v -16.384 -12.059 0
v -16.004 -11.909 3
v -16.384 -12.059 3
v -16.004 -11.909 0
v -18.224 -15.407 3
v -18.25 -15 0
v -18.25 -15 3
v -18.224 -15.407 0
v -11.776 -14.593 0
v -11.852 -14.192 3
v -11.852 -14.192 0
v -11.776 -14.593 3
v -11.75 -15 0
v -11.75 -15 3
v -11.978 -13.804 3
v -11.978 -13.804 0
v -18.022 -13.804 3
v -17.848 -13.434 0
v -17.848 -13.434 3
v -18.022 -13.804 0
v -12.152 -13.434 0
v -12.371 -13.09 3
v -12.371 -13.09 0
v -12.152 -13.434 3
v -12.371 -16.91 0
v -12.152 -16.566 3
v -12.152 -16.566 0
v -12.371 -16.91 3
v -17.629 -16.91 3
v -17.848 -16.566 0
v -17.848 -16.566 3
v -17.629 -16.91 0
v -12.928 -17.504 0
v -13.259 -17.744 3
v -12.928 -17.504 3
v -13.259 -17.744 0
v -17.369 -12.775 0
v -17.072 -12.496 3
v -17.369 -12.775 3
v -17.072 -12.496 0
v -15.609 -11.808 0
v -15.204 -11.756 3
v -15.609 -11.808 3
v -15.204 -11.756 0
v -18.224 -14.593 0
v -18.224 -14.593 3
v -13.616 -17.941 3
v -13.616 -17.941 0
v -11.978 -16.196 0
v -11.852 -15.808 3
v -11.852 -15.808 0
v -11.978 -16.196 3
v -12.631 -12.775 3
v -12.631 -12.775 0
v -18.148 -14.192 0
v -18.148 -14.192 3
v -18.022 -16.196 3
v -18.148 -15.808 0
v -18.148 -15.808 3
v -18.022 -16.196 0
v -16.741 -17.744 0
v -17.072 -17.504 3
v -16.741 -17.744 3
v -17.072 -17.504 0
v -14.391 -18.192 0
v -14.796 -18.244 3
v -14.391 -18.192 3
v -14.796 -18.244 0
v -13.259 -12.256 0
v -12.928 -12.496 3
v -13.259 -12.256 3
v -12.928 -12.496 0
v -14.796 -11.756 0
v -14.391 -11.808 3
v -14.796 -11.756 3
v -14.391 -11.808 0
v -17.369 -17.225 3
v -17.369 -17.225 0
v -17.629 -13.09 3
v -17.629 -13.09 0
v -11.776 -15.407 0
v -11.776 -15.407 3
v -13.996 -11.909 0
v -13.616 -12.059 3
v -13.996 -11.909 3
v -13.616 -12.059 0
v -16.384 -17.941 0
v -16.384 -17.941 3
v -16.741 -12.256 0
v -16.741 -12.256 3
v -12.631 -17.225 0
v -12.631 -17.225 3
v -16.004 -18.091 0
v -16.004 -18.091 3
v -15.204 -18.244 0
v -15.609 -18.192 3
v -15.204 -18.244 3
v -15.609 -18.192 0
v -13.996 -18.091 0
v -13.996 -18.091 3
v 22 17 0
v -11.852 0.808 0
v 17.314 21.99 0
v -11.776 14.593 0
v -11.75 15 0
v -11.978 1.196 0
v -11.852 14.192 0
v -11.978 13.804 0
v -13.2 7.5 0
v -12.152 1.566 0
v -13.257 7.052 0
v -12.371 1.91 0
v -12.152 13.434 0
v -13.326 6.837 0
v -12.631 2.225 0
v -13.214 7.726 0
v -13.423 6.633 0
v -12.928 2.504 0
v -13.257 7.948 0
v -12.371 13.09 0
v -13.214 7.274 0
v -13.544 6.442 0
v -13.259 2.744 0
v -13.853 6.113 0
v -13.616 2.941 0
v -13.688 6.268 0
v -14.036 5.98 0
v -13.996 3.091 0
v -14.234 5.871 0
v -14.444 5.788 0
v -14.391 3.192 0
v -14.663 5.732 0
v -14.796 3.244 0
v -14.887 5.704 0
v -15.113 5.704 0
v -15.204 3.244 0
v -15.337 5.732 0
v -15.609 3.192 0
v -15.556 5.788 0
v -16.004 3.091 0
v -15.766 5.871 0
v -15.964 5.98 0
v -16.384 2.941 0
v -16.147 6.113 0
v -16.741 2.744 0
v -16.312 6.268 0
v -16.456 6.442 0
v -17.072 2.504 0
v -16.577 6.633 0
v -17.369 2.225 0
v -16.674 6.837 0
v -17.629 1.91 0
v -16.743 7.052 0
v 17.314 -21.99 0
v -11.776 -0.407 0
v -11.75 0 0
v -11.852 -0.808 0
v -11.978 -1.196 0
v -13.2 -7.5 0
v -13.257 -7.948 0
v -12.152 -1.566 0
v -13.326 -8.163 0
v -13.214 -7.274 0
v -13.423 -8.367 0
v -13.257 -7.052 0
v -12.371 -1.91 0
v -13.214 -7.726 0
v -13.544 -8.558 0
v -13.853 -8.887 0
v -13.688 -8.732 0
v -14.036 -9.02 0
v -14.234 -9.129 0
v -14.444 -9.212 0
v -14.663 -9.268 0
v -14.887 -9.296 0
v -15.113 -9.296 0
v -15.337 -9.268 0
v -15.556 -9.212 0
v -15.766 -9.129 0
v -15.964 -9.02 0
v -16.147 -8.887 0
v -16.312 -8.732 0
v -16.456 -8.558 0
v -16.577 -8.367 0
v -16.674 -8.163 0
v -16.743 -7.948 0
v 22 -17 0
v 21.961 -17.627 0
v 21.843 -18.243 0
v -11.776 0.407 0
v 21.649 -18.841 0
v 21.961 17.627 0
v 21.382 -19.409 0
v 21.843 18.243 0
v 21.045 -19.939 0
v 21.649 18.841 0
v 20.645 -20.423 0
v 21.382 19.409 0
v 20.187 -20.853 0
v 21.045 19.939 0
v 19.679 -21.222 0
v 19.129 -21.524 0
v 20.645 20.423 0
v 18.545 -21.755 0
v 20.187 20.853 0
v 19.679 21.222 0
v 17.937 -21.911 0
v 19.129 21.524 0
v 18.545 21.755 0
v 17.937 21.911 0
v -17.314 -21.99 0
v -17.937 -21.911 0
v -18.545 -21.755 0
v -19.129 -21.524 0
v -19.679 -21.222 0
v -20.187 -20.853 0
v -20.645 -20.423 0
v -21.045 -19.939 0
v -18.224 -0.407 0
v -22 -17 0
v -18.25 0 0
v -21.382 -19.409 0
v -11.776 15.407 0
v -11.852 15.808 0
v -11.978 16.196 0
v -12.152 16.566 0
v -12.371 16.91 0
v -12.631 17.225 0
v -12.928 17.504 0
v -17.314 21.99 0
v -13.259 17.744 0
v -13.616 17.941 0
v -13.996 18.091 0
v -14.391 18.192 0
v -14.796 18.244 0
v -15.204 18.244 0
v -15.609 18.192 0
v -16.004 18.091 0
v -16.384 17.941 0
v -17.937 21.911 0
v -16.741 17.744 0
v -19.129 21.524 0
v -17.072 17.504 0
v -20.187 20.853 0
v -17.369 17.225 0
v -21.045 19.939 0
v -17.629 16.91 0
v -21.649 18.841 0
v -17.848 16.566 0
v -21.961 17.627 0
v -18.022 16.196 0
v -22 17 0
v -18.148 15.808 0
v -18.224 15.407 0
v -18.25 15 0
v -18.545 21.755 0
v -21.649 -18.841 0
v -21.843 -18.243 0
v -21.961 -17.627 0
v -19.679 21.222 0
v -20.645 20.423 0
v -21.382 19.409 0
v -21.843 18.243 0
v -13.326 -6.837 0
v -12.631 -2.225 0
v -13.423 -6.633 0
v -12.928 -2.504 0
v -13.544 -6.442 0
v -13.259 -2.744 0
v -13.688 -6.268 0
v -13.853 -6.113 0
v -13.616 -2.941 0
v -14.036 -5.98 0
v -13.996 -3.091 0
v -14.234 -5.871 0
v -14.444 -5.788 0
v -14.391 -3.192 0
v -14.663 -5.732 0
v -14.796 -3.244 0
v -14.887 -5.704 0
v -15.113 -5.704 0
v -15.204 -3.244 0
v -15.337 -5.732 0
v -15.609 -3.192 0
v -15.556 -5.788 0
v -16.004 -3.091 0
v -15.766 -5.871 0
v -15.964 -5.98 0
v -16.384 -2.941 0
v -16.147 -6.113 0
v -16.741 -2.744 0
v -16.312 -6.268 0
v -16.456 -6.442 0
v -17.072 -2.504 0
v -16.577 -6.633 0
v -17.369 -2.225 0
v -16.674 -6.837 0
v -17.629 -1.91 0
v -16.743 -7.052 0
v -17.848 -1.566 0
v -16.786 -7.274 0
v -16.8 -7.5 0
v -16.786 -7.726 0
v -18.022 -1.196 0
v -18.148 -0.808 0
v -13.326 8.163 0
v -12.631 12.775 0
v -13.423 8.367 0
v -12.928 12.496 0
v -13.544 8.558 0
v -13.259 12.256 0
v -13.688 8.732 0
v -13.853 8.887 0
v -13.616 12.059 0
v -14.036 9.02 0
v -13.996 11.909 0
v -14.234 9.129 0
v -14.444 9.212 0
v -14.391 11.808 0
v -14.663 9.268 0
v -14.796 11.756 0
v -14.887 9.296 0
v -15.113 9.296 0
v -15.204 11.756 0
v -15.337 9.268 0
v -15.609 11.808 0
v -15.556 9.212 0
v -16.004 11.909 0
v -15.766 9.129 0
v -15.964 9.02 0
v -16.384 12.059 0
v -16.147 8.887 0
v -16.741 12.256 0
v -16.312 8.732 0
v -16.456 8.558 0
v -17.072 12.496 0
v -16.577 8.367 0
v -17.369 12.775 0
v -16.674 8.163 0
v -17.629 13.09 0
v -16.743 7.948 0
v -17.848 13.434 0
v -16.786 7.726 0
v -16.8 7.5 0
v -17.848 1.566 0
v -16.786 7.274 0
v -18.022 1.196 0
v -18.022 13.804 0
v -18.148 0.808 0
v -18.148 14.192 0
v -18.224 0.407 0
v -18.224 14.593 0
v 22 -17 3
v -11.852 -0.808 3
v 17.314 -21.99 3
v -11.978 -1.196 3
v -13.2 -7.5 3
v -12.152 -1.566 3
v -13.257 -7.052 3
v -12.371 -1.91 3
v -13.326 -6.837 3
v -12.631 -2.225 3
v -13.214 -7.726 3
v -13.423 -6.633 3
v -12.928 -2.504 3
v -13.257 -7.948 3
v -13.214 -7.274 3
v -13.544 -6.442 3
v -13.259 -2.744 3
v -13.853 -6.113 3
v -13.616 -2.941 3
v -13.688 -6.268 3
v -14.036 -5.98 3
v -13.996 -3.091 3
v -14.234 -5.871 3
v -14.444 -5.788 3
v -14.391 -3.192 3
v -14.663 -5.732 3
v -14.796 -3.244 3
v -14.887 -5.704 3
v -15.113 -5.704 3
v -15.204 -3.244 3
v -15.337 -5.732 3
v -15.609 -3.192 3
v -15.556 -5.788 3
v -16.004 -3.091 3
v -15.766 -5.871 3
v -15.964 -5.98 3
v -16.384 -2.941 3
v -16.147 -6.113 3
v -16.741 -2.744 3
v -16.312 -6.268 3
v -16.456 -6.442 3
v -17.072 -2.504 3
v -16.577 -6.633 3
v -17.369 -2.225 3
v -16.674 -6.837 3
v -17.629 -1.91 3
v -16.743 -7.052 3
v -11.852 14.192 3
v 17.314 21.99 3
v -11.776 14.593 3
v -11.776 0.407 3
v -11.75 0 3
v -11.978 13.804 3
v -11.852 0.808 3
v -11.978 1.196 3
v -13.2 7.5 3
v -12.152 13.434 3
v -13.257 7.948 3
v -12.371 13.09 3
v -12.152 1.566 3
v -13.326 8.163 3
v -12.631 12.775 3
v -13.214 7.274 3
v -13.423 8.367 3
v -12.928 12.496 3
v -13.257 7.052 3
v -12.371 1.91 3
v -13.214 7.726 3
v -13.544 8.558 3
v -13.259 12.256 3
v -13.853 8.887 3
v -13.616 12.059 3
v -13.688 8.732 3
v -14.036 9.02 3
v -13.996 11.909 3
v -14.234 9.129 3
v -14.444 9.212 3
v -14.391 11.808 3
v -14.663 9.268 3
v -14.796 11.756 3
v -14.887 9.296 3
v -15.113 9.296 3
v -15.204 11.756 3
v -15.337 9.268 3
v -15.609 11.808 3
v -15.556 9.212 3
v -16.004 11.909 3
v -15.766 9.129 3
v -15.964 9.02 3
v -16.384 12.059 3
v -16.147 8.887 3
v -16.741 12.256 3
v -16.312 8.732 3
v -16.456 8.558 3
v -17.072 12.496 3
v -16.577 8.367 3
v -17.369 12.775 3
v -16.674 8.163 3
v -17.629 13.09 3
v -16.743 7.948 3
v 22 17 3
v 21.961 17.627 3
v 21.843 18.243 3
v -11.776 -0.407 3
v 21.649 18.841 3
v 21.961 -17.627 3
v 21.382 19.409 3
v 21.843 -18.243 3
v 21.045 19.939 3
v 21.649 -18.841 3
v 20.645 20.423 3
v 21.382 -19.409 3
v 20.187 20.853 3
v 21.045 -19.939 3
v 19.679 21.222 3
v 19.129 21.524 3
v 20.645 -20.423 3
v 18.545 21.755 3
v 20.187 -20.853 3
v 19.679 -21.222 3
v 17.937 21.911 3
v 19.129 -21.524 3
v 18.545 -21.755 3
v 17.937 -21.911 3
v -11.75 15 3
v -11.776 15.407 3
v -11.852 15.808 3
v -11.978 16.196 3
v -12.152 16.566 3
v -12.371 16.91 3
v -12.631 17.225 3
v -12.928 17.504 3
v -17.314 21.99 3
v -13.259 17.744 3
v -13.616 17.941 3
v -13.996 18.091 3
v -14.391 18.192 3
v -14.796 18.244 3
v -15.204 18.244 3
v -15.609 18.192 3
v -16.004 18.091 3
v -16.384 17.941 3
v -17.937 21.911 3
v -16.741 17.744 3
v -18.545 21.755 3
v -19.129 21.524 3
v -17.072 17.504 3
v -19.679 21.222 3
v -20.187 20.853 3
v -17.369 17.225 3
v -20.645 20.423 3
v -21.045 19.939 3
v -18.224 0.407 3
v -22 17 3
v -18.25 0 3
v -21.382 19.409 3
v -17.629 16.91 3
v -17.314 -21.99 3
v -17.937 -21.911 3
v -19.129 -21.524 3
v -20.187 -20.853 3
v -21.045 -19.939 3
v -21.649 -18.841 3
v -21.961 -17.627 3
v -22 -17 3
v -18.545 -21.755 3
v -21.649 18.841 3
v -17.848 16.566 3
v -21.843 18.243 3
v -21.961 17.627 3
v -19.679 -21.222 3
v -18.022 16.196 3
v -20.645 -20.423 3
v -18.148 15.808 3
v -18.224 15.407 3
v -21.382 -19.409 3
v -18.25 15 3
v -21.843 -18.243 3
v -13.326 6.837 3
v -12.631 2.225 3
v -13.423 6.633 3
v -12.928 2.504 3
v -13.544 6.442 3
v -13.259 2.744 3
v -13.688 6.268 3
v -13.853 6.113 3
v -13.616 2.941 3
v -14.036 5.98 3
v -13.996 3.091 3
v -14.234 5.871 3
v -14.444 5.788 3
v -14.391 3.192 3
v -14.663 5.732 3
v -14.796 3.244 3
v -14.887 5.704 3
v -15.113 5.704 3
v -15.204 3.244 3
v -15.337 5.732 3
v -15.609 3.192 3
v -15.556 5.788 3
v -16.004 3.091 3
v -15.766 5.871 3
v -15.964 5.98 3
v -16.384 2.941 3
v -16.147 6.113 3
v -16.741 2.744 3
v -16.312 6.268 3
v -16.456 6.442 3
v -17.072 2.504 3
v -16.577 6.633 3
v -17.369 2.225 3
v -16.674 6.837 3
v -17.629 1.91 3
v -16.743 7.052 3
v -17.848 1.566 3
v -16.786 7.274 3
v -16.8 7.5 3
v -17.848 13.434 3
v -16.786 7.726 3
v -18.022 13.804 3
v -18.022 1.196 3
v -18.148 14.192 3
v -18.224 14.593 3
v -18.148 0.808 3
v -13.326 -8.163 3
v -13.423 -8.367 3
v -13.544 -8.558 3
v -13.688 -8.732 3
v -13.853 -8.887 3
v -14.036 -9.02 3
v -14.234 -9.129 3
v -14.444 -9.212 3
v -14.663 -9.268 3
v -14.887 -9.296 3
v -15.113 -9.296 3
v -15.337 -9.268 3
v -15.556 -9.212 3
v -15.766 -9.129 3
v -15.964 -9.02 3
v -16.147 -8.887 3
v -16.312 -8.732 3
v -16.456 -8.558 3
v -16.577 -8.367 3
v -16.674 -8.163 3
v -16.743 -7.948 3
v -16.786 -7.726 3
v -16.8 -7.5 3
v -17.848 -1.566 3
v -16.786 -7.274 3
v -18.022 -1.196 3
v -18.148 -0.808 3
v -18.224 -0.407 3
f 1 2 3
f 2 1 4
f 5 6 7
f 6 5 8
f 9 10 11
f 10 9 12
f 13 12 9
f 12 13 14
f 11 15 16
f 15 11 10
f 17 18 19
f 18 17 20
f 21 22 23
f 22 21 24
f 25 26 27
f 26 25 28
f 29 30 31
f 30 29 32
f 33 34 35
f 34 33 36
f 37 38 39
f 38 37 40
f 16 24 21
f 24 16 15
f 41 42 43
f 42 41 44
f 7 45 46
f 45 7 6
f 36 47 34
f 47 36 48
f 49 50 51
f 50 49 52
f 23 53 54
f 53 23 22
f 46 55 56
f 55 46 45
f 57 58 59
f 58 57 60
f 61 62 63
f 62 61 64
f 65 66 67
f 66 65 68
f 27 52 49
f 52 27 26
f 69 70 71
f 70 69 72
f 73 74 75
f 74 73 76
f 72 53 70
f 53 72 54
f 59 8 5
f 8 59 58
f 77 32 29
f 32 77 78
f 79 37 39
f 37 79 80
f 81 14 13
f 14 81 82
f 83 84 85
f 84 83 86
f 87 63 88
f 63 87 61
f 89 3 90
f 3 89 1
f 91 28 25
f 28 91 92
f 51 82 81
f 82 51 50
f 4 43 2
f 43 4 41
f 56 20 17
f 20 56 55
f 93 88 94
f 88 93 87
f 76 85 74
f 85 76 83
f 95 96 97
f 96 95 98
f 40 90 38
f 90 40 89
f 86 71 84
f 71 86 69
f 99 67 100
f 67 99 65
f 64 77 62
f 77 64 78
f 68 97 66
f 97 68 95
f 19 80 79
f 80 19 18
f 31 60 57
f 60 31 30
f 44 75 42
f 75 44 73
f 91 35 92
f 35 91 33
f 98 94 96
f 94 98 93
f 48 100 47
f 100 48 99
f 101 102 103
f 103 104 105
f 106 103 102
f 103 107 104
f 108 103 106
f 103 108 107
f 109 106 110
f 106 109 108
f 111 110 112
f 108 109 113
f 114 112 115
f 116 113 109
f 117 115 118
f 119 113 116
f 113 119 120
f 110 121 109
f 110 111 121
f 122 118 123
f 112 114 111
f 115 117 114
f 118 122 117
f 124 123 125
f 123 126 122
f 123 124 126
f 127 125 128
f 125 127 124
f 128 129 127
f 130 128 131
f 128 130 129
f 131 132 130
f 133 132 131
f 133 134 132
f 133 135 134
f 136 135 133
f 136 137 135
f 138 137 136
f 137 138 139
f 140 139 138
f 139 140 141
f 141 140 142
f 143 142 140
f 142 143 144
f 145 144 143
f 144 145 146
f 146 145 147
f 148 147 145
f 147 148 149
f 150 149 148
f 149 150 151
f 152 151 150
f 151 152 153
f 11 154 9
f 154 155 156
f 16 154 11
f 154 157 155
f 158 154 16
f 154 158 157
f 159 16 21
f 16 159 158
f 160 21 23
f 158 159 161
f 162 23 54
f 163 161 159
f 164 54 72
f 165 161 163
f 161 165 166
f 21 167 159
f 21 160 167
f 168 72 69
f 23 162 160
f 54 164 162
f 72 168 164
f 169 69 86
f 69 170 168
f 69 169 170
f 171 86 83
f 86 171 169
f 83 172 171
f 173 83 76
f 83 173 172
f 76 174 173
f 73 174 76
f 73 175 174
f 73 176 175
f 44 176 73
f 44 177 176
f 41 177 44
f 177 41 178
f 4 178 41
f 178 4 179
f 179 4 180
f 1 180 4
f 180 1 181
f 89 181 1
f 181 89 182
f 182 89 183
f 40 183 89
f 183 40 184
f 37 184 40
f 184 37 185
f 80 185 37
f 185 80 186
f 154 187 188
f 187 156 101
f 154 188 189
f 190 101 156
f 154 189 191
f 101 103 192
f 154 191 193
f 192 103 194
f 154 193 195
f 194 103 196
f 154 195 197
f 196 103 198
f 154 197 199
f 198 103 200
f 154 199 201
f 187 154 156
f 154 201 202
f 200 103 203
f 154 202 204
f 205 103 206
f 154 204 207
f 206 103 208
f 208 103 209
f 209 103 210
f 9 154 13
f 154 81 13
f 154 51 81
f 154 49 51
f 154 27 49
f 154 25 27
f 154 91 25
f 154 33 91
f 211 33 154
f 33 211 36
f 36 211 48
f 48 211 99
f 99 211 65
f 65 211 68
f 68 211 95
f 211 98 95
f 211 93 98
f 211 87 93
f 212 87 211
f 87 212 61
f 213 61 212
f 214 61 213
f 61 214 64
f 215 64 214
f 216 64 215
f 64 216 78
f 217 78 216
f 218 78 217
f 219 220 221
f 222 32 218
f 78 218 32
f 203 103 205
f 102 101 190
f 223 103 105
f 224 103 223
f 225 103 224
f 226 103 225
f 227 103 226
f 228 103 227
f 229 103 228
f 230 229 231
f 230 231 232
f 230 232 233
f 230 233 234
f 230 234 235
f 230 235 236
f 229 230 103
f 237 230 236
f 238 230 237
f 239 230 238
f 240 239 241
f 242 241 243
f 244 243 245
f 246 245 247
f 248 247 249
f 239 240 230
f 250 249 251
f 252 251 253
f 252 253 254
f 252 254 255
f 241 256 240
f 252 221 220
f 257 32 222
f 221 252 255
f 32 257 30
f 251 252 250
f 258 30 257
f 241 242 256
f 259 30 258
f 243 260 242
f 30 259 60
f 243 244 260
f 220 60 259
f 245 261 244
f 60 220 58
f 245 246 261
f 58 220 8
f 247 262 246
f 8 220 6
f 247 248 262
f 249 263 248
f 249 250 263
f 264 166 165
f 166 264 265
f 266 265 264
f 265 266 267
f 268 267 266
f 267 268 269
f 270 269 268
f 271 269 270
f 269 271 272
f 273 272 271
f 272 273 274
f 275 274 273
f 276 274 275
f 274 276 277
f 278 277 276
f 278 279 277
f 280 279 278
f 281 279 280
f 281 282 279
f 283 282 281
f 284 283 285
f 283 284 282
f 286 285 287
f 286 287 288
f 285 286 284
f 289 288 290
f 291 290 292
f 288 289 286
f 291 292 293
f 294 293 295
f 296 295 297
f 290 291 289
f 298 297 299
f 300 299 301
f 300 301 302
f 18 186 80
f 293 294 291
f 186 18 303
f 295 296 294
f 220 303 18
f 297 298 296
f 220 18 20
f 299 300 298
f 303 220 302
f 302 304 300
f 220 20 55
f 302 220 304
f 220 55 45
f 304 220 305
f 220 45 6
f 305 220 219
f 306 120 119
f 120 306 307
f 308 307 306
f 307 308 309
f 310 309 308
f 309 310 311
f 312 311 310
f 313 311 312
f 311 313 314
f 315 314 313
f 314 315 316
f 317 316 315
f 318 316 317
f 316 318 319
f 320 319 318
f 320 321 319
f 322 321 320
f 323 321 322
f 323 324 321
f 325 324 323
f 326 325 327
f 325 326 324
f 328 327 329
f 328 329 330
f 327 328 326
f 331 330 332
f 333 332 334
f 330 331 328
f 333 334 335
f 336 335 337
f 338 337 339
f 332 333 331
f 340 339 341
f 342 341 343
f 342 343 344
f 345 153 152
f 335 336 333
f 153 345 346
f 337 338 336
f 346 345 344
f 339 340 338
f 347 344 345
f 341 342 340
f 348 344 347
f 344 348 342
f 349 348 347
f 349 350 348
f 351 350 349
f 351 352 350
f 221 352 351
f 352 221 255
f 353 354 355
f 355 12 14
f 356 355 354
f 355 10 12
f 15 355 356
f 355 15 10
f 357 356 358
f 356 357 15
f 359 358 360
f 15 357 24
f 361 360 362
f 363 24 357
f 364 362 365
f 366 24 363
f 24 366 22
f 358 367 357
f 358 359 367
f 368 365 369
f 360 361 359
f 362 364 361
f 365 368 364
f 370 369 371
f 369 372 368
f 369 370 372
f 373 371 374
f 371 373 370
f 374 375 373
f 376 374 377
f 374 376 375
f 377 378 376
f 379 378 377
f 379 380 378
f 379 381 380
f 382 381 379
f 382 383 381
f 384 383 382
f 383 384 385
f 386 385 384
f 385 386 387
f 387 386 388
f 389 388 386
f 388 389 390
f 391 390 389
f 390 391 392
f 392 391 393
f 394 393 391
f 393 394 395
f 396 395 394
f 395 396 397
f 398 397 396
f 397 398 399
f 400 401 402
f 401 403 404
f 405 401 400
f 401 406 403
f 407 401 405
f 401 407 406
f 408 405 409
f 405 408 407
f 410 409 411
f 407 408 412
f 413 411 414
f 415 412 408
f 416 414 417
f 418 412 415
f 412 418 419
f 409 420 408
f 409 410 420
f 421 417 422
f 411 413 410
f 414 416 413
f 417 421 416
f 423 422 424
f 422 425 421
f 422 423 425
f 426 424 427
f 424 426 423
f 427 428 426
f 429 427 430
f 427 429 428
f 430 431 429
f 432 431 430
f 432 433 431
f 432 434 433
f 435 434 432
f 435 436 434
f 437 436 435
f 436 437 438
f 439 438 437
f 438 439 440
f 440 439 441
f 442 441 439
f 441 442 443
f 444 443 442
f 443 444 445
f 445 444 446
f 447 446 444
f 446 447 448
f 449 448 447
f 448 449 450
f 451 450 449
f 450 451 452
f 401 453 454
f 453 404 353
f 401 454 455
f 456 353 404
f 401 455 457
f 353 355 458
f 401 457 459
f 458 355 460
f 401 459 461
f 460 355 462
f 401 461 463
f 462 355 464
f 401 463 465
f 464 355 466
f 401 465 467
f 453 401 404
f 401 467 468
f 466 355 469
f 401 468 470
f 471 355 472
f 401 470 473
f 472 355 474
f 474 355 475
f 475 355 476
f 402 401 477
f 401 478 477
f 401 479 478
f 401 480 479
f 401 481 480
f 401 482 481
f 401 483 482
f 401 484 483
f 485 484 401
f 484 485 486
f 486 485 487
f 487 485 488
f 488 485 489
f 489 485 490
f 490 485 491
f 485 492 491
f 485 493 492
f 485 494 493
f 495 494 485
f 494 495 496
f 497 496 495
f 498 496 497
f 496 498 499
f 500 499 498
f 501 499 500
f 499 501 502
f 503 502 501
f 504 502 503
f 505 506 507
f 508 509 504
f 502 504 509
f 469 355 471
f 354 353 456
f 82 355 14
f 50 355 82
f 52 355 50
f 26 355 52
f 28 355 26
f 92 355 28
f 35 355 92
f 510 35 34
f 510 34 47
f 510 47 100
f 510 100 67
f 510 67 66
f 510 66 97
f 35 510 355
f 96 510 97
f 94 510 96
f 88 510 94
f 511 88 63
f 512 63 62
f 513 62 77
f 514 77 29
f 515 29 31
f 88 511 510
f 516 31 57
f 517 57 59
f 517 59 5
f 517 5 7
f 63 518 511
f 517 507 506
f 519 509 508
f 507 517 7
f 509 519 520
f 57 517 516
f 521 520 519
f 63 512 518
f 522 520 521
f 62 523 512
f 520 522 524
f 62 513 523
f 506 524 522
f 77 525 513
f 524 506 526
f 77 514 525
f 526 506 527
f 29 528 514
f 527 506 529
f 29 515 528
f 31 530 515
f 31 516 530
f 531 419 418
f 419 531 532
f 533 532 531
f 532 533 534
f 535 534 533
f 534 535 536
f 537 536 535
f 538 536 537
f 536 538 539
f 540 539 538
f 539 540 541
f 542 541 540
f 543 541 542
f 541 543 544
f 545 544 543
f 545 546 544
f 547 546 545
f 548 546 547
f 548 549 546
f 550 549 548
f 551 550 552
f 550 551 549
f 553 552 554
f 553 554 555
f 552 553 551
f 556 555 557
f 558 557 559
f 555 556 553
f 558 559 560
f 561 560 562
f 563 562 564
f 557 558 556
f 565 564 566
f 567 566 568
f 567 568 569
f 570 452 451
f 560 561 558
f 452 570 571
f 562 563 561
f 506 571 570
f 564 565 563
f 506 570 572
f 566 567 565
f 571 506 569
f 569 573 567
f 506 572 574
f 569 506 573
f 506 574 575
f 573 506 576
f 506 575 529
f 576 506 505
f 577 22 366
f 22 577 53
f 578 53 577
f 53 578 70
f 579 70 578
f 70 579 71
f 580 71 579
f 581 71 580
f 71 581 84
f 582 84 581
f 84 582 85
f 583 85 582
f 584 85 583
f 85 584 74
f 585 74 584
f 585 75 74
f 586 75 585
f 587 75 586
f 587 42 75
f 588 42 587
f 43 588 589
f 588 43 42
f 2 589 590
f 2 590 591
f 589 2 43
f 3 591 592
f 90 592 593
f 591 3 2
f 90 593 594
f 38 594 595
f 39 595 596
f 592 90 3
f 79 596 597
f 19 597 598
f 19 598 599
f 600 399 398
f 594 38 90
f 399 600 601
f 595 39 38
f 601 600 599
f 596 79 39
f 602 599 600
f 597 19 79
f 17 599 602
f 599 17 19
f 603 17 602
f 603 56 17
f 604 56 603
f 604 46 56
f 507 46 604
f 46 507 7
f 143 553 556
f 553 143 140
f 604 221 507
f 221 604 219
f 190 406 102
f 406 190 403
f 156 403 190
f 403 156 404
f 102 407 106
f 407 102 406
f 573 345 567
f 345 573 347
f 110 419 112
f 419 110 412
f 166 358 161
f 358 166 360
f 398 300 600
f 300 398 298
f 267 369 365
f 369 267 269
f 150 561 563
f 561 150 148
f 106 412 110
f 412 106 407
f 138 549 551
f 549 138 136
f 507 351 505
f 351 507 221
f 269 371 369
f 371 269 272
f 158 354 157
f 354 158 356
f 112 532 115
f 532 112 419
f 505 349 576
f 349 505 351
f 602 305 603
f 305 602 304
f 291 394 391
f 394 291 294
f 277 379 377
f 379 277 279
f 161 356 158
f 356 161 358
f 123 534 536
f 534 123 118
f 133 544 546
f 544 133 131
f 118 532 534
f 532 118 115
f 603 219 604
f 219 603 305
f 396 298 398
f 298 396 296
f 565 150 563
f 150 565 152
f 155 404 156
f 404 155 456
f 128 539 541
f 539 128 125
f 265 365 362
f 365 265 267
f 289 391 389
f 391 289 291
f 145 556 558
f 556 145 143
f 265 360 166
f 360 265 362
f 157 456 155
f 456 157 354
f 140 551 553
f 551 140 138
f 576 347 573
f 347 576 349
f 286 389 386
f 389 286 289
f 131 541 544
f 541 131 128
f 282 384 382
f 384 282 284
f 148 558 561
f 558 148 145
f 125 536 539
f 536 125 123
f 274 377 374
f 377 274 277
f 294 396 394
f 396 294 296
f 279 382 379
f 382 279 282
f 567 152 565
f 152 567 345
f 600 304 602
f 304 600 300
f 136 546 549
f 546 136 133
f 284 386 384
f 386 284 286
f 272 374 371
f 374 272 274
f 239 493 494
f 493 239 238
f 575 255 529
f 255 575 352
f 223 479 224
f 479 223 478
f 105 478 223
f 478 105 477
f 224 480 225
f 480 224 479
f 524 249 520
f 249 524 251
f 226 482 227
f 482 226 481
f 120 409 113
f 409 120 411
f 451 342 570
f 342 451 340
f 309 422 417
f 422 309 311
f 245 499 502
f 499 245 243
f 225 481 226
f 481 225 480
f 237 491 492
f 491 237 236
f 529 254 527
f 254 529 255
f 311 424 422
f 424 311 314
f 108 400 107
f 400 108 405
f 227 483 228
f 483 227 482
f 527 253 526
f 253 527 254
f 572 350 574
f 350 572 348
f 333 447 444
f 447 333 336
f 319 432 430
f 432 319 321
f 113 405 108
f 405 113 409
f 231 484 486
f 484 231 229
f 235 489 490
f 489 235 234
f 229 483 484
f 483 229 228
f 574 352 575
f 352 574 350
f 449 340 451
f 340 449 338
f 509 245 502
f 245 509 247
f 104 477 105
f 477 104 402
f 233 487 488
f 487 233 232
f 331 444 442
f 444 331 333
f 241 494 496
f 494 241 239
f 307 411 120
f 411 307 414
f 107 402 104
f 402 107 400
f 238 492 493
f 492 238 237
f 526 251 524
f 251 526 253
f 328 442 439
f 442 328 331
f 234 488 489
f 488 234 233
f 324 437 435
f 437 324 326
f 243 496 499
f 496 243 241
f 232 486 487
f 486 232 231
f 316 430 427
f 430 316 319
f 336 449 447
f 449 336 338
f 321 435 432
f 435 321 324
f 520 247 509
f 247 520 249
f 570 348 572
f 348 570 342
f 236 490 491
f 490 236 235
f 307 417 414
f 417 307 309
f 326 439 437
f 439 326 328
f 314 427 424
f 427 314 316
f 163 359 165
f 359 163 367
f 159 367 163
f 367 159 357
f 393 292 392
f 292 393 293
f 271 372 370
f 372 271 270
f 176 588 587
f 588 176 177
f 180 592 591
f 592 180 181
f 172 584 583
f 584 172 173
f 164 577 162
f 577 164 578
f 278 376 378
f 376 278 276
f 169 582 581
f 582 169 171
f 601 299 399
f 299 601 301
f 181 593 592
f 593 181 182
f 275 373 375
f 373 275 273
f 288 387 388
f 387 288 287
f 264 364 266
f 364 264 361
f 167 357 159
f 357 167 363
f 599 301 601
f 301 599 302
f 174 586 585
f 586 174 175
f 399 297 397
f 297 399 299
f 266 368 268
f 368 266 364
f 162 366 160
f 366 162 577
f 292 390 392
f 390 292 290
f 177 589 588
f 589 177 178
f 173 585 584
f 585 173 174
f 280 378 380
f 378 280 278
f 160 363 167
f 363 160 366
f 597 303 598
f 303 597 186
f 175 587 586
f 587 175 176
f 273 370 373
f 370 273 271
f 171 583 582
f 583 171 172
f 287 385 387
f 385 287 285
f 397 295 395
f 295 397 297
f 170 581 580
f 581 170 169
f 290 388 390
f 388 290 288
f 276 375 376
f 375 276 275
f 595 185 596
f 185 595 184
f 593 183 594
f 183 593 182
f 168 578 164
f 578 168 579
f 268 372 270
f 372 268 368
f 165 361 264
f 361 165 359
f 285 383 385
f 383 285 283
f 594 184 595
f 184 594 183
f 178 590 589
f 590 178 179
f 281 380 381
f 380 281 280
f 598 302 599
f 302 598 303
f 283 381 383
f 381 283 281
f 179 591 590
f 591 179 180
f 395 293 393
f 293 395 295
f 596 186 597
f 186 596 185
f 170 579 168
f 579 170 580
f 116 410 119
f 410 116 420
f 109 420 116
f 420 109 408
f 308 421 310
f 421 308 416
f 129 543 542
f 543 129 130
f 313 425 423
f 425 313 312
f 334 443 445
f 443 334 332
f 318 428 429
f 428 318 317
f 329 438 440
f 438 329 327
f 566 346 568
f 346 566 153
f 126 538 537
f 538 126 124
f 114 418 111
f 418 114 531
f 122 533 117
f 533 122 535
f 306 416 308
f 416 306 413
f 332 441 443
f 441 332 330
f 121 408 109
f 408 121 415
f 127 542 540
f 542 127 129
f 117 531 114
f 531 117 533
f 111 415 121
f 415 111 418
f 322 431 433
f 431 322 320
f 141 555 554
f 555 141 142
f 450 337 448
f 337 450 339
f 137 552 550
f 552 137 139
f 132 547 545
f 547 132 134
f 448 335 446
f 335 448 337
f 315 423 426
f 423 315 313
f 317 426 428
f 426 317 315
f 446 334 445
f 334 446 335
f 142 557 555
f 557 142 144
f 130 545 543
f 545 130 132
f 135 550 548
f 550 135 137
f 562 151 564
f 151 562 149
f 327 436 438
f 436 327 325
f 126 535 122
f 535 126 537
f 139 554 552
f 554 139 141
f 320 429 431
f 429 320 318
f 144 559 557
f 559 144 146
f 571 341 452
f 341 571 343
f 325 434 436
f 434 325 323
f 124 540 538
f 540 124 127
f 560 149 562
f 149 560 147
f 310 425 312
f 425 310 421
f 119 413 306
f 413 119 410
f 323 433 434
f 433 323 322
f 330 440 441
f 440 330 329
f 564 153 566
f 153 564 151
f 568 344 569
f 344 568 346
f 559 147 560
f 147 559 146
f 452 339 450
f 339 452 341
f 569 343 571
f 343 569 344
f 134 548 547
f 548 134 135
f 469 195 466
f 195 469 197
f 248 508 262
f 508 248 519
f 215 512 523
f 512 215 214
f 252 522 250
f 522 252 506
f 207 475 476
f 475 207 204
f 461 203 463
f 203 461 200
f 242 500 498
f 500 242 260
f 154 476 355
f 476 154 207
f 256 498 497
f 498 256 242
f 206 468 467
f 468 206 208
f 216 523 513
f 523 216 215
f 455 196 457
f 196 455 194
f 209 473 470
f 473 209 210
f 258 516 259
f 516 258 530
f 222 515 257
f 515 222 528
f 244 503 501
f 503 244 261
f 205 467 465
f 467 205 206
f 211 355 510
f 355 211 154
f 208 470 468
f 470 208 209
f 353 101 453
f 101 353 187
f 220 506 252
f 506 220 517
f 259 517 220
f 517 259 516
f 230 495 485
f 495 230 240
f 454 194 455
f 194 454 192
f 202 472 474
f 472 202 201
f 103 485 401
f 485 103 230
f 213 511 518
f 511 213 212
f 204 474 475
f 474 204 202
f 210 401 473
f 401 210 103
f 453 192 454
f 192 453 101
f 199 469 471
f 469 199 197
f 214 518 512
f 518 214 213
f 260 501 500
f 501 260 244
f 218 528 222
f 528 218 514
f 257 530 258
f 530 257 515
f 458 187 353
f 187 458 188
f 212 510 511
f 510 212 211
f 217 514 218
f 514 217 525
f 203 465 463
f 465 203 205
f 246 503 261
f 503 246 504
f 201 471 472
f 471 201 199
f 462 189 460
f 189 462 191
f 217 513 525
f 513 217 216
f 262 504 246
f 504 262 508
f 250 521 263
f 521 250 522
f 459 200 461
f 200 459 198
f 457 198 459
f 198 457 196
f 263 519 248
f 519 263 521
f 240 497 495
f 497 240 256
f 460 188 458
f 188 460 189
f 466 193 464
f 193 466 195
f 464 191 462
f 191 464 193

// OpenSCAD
$fn = 50;


difference() {
	union() {
		hull() {
			translate(v = [-17.0000000000, 17.0000000000, 0]) {
				cylinder(h = 3, r = 5);
			}
			translate(v = [17.0000000000, 17.0000000000, 0]) {
				cylinder(h = 3, r = 5);
			}
			translate(v = [-17.0000000000, -17.0000000000, 0]) {
				cylinder(h = 3, r = 5);
			}
			translate(v = [17.0000000000, -17.0000000000, 0]) {
				cylinder(h = 3, r = 5);
			}
		}
	}
	union() {
		translate(v = [-15.0000000000, -15.0000000000, 0]) {
			cylinder(h = 3, r = 3.2500000000);
		}
		translate(v = [-15.0000000000, 0.0000000000, 0]) {
			cylinder(h = 3, r = 3.2500000000);
		}
		translate(v = [-15.0000000000, 15.0000000000, 0]) {
			cylinder(h = 3, r = 3.2500000000);
		}
		translate(v = [-15.0000000000, -15.0000000000, 0]) {
			cylinder(h = 3, r = 1.8000000000);
		}
		translate(v = [-15.0000000000, -7.5000000000, 0]) {
			cylinder(h = 3, r = 1.8000000000);
		}
		translate(v = [-15.0000000000, 0.0000000000, 0]) {
			cylinder(h = 3, r = 1.8000000000);
		}
		translate(v = [-15.0000000000, 7.5000000000, 0]) {
			cylinder(h = 3, r = 1.8000000000);
		}
		translate(v = [-15.0000000000, 15.0000000000, 0]) {
			cylinder(h = 3, r = 1.8000000000);
		}
		translate(v = [-15.0000000000, -15.0000000000, 0]) {
			cylinder(h = 3, r = 1.8000000000);
		}
		translate(v = [-15.0000000000, -7.5000000000, 0]) {
			cylinder(h = 3, r = 1.8000000000);
		}
		translate(v = [-15.0000000000, 0.0000000000, 0]) {
			cylinder(h = 3, r = 1.8000000000);
		}
		translate(v = [-15.0000000000, 7.5000000000, 0]) {
			cylinder(h = 3, r = 1.8000000000);
		}
		translate(v = [-15.0000000000, 15.0000000000, 0]) {
			cylinder(h = 3, r = 1.8000000000);
		}
		translate(v = [-15.0000000000, -15.0000000000, 0]) {
			cylinder(h = 3, r = 1.8000000000);
		}
		translate(v = [-15.0000000000, -7.5000000000, 0]) {
			cylinder(h = 3, r = 1.8000000000);
		}
		translate(v = [-15.0000000000, 0.0000000000, 0]) {
			cylinder(h = 3, r = 1.8000000000);
		}
		translate(v = [-15.0000000000, 7.5000000000, 0]) {
			cylinder(h = 3, r = 1.8000000000);
		}
		translate(v = [-15.0000000000, 15.0000000000, 0]) {
			cylinder(h = 3, r = 1.8000000000);
		}
	}
}
